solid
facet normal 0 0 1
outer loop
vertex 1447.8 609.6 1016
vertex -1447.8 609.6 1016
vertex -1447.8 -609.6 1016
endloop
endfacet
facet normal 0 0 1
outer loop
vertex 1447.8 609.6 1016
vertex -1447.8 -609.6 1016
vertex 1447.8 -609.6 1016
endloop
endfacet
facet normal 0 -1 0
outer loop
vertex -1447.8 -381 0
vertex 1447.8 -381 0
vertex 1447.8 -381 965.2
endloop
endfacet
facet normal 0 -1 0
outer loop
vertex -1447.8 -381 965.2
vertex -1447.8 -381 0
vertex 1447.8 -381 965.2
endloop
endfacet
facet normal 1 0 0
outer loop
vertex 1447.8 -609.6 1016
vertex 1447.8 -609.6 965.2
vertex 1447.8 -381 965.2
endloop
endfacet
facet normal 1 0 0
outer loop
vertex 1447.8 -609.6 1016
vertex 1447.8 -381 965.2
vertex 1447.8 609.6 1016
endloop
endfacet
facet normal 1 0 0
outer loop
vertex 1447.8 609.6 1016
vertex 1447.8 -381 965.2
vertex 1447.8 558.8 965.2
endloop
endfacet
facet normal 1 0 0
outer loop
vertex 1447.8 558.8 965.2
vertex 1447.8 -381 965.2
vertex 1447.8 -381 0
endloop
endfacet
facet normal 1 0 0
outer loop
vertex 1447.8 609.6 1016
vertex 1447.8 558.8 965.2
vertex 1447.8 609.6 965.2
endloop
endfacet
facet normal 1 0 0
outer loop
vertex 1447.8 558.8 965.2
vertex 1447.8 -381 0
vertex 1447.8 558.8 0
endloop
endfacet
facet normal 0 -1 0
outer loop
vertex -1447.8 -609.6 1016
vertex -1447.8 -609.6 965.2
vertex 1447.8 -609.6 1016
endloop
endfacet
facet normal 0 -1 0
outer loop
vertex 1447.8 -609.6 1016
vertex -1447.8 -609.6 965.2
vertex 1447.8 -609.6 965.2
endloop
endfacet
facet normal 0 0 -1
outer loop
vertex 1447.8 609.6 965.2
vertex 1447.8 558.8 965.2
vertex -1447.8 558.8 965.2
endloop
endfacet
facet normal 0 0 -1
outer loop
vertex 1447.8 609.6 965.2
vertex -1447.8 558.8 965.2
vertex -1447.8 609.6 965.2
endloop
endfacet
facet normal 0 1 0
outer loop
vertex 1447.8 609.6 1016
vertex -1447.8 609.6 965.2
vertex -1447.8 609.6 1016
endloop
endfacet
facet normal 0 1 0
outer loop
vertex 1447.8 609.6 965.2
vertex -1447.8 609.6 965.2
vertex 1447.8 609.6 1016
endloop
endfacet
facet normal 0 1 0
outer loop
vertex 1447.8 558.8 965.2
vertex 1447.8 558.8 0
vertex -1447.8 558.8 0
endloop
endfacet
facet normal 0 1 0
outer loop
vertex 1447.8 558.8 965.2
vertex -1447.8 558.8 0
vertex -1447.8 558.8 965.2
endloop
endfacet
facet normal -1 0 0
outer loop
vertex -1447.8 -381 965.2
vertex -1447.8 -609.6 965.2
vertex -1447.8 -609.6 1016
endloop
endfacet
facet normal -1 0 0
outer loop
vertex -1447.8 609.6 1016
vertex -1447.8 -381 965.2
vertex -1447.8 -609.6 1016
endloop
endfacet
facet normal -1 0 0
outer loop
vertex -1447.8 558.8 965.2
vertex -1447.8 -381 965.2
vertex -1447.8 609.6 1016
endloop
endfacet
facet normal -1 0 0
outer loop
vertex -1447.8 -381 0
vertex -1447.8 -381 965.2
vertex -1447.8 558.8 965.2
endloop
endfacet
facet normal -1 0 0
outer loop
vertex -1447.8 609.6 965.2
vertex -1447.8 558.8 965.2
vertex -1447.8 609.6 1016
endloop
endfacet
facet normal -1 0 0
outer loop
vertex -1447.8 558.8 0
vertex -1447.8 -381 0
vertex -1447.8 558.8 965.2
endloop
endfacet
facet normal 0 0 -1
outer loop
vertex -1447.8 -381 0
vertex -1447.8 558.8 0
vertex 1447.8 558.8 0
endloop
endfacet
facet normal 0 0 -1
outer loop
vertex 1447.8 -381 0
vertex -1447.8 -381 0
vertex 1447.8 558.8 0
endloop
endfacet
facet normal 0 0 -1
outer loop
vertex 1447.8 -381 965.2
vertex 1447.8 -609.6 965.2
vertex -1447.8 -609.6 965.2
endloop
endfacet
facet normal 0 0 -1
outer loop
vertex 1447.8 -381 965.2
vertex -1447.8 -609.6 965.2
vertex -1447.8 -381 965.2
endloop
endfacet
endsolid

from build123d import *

# Parameters (mm, degrees)
F0_W     = 2895.6
F0_H     = 1219.2
F1_DEPTH = 1016
F2_W     = 228.6
F2_H     = 965.2
F2_W_2   = 50.8
F3_DEPTH = 3048


with BuildPart() as f1:
    # F0 (on Top) → F1 (new body)
    with BuildSketch(Plane.XY):
        Rectangle(F0_W, F0_H)
    extrude(amount=F1_DEPTH)

    # F2 (on face) → F3 (cut)
    with BuildSketch(Plane.YZ.offset(1447.8)):
        with Locations((-495.3, 482.6)):
            Rectangle(F2_W, F2_H)
        with Locations((584.2, 482.6)):
            Rectangle(F2_W_2, F2_H)
    extrude(amount=-F3_DEPTH, mode=Mode.SUBTRACT)


solid = f1.part
